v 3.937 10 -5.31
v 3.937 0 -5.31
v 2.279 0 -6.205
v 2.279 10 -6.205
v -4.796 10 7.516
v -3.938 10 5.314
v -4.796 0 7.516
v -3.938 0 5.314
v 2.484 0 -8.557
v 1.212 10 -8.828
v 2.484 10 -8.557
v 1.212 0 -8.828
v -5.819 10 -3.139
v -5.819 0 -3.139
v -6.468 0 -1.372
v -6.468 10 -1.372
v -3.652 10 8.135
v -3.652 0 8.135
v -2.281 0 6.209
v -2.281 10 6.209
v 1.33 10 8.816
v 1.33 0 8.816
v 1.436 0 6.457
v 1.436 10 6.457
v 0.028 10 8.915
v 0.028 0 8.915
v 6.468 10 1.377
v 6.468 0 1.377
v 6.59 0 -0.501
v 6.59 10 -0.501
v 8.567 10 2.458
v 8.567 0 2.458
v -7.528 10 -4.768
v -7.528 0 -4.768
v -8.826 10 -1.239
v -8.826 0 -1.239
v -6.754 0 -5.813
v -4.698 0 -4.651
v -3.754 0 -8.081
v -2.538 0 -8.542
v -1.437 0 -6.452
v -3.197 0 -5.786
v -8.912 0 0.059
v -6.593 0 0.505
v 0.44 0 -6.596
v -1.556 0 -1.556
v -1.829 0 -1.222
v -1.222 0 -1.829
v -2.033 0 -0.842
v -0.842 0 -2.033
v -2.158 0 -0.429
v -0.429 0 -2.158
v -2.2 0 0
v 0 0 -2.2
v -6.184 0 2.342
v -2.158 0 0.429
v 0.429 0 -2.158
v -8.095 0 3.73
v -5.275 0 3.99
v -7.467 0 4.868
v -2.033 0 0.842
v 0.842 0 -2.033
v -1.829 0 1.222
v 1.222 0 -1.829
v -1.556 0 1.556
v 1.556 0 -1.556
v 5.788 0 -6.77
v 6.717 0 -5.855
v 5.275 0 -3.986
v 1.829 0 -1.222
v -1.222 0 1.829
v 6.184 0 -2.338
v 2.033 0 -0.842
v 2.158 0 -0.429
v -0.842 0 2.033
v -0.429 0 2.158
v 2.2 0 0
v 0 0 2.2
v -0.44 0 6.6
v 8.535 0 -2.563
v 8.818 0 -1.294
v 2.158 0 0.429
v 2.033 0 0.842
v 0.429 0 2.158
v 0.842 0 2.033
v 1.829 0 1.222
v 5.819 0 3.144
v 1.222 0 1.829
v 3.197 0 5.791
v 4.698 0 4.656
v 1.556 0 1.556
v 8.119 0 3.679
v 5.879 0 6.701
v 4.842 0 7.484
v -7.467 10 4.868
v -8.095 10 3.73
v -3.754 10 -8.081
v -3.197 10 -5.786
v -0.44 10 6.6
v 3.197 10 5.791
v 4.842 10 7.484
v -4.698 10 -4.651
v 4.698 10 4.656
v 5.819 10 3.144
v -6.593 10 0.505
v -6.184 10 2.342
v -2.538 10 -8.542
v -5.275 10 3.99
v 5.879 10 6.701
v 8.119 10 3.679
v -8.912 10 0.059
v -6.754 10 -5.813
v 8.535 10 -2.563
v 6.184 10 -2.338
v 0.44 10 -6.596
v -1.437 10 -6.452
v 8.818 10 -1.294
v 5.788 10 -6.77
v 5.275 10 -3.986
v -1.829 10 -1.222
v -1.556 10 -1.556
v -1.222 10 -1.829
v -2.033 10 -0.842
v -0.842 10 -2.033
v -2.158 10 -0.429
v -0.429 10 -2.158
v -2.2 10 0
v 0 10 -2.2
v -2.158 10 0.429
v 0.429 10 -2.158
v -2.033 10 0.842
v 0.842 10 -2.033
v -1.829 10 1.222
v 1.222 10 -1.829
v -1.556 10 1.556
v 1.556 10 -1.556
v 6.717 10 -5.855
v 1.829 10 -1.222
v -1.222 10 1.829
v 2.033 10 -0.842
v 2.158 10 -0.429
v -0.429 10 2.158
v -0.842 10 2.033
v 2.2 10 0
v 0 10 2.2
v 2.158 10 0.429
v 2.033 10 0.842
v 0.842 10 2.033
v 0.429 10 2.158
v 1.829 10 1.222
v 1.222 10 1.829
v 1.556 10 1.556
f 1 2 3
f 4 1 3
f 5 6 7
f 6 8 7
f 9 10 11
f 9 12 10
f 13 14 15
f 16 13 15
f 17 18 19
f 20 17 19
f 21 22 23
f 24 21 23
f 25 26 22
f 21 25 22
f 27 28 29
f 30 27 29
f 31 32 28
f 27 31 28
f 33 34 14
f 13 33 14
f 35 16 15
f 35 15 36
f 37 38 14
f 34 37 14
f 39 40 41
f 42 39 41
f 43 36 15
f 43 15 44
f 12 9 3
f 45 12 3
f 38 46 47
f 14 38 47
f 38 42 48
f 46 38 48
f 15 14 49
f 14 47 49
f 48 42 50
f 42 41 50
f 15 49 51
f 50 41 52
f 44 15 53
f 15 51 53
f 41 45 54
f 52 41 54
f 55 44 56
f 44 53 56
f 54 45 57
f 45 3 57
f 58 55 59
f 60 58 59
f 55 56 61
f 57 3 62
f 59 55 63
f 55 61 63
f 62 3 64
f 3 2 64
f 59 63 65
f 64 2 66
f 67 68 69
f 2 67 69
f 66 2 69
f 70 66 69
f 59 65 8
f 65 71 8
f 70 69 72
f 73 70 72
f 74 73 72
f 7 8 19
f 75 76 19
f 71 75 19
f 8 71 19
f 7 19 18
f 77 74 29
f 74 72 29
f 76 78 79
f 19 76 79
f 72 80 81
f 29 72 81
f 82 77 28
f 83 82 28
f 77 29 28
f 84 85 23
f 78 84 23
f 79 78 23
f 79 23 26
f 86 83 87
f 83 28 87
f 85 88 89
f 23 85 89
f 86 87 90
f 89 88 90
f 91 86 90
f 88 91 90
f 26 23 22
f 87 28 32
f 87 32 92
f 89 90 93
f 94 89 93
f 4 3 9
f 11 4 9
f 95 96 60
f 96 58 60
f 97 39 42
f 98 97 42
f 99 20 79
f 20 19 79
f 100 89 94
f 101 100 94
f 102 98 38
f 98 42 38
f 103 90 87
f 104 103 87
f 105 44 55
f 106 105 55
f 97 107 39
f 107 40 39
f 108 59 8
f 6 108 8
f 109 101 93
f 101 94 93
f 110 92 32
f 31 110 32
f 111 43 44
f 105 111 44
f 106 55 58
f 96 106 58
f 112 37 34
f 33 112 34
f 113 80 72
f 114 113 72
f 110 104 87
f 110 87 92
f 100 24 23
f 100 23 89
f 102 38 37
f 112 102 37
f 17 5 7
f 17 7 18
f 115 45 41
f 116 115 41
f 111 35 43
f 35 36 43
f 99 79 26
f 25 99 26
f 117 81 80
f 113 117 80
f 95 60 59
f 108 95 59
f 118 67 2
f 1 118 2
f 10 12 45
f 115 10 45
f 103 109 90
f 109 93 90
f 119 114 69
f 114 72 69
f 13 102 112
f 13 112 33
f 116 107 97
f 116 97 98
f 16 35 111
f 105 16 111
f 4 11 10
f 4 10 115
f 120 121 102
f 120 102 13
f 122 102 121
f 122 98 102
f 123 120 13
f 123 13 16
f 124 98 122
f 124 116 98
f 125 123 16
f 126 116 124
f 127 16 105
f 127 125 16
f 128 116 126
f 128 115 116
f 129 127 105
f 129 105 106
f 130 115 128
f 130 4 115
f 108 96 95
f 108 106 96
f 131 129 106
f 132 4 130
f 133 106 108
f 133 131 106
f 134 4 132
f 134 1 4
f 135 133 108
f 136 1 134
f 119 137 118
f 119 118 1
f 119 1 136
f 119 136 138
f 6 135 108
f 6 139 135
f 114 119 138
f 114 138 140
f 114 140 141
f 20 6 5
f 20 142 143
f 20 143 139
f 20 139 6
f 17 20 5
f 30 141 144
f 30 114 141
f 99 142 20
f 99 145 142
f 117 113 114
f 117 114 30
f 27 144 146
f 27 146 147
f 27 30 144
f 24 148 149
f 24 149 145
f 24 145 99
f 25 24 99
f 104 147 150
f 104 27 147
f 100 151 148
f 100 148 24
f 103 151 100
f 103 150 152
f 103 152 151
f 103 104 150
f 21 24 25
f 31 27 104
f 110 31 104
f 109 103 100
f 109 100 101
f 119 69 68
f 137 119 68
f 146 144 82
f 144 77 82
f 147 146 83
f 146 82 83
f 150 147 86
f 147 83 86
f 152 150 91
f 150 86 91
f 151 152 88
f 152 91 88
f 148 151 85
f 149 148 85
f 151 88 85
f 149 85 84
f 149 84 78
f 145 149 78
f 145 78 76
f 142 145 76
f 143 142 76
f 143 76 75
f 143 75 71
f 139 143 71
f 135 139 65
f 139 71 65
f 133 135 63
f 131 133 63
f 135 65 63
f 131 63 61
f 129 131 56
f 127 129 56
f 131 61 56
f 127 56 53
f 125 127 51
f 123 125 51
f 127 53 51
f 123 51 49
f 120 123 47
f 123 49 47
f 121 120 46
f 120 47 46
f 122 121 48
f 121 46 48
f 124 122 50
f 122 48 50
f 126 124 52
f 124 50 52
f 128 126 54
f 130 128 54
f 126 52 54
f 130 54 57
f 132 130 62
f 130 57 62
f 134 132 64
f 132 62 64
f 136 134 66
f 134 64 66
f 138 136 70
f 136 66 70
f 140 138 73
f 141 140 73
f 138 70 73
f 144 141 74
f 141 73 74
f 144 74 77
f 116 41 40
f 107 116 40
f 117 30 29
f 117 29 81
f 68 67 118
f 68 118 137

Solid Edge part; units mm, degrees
sketch "Sketch1" plane through (0, 0, 0) normal (0, -1, 0) x (1, 0, 0)
  line L0 (-0.44, 6.6004) -> (0.0279, 8.9147)
  line L1 (0.0279, 8.9147) -> (1.3295, 8.8156)
  line L2 (1.3295, 8.8156) -> (1.4363, 6.4566)
  line L3 (1.4363, 6.4566) -> (3.1967, 5.7909)
  line L4 (3.1967, 5.7909) -> (4.842, 7.4845)
  line L5 (4.842, 7.4845) -> (5.8791, 6.7006)
  line L6 (5.8791, 6.7006) -> (4.6981, 4.6555)
  line L7 (4.6981, 4.6555) -> (5.8186, 3.1435)
  line L8 (5.8186, 3.1435) -> (8.1187, 3.6789)
  line L9 (8.1187, 3.6789) -> (8.5671, 2.4584)
  line L10 (8.5671, 2.4584) -> (6.468, 1.3769)
  line L11 (6.468, 1.3769) -> (6.5896, -0.5008)
  line L12 (6.5896, -0.5008) -> (8.8178, -1.2937)
  line L13 (8.8178, -1.2937) -> (8.5352, -2.5633)
  line L14 (8.5352, -2.5633) -> (6.1844, -2.3383)
  line L15 (6.1844, -2.3383) -> (5.2746, -3.9858)
  line L16 (5.2746, -3.9858) -> (6.7172, -5.8554)
  line L17 (5.7878, -6.7699) -> (6.7172, -5.8554)
  line L18 (5.7878, -6.7699) -> (3.9371, -5.3105)
  line L19 (3.9371, -5.3105) -> (2.2793, -6.2046)
  line L20 (2.2793, -6.2046) -> (2.4841, -8.5573)
  line L21 (1.2122, -8.8277) -> (2.4841, -8.5573)
  line L22 (1.2122, -8.8277) -> (0.4404, -6.5956)
  line L23 (0.4404, -6.5956) -> (-1.437, -6.4523)
  line L24 (-1.437, -6.4523) -> (-2.5378, -8.5415)
  line L25 (-2.5378, -8.5415) -> (-3.7539, -8.0813)
  line L26 (-3.7539, -8.0813) -> (-3.1969, -5.7862)
  line L27 (-3.1969, -5.7862) -> (-4.6979, -4.6514)
  line L28 (-4.6979, -4.6514) -> (-6.7545, -5.813)
  line L29 (-6.7545, -5.813) -> (-7.5283, -4.7685)
  line L30 (-7.5283, -4.7685) -> (-5.819, -3.1393)
  line L31 (-5.819, -3.1393) -> (-6.4682, -1.3724)
  line L32 (-6.4682, -1.3724) -> (-8.8258, -1.2386)
  line L33 (-8.8258, -1.2386) -> (-8.9124, 0.0589)
  line L34 (-8.9124, 0.0589) -> (-6.5933, 0.5052)
  line L35 (-6.5933, 0.5052) -> (-6.1845, 2.3423)
  line L36 (-6.1845, 2.3423) -> (-8.0954, 3.73)
  line L37 (-8.0954, 3.73) -> (-7.4668, 4.8682)
  line L38 (-7.4668, 4.8682) -> (-5.2747, 3.9899)
  line L39 (-5.2747, 3.9899) -> (-3.9375, 5.3144)
  line L40 (-3.9375, 5.3144) -> (-4.796, 7.5158)
  line L41 (-4.796, 7.5158) -> (-3.6515, 8.1347)
  line L42 (-3.6515, 8.1347) -> (-2.2812, 6.2087)
  line L43 (-2.2812, 6.2087) -> (-0.44, 6.6004)
extrude "Protrusion1" add sketch "Sketch1" against normal blind 10
sketch "Sketch2" plane through (0, 0, 0) normal (0, -1, 0) x (1, 0, 0)
  circle A0 centre (0, 0) radius 2.2
extrude "ExtrudedCutout_1" cut sketch "Sketch2" against normal blind 1588.2379
